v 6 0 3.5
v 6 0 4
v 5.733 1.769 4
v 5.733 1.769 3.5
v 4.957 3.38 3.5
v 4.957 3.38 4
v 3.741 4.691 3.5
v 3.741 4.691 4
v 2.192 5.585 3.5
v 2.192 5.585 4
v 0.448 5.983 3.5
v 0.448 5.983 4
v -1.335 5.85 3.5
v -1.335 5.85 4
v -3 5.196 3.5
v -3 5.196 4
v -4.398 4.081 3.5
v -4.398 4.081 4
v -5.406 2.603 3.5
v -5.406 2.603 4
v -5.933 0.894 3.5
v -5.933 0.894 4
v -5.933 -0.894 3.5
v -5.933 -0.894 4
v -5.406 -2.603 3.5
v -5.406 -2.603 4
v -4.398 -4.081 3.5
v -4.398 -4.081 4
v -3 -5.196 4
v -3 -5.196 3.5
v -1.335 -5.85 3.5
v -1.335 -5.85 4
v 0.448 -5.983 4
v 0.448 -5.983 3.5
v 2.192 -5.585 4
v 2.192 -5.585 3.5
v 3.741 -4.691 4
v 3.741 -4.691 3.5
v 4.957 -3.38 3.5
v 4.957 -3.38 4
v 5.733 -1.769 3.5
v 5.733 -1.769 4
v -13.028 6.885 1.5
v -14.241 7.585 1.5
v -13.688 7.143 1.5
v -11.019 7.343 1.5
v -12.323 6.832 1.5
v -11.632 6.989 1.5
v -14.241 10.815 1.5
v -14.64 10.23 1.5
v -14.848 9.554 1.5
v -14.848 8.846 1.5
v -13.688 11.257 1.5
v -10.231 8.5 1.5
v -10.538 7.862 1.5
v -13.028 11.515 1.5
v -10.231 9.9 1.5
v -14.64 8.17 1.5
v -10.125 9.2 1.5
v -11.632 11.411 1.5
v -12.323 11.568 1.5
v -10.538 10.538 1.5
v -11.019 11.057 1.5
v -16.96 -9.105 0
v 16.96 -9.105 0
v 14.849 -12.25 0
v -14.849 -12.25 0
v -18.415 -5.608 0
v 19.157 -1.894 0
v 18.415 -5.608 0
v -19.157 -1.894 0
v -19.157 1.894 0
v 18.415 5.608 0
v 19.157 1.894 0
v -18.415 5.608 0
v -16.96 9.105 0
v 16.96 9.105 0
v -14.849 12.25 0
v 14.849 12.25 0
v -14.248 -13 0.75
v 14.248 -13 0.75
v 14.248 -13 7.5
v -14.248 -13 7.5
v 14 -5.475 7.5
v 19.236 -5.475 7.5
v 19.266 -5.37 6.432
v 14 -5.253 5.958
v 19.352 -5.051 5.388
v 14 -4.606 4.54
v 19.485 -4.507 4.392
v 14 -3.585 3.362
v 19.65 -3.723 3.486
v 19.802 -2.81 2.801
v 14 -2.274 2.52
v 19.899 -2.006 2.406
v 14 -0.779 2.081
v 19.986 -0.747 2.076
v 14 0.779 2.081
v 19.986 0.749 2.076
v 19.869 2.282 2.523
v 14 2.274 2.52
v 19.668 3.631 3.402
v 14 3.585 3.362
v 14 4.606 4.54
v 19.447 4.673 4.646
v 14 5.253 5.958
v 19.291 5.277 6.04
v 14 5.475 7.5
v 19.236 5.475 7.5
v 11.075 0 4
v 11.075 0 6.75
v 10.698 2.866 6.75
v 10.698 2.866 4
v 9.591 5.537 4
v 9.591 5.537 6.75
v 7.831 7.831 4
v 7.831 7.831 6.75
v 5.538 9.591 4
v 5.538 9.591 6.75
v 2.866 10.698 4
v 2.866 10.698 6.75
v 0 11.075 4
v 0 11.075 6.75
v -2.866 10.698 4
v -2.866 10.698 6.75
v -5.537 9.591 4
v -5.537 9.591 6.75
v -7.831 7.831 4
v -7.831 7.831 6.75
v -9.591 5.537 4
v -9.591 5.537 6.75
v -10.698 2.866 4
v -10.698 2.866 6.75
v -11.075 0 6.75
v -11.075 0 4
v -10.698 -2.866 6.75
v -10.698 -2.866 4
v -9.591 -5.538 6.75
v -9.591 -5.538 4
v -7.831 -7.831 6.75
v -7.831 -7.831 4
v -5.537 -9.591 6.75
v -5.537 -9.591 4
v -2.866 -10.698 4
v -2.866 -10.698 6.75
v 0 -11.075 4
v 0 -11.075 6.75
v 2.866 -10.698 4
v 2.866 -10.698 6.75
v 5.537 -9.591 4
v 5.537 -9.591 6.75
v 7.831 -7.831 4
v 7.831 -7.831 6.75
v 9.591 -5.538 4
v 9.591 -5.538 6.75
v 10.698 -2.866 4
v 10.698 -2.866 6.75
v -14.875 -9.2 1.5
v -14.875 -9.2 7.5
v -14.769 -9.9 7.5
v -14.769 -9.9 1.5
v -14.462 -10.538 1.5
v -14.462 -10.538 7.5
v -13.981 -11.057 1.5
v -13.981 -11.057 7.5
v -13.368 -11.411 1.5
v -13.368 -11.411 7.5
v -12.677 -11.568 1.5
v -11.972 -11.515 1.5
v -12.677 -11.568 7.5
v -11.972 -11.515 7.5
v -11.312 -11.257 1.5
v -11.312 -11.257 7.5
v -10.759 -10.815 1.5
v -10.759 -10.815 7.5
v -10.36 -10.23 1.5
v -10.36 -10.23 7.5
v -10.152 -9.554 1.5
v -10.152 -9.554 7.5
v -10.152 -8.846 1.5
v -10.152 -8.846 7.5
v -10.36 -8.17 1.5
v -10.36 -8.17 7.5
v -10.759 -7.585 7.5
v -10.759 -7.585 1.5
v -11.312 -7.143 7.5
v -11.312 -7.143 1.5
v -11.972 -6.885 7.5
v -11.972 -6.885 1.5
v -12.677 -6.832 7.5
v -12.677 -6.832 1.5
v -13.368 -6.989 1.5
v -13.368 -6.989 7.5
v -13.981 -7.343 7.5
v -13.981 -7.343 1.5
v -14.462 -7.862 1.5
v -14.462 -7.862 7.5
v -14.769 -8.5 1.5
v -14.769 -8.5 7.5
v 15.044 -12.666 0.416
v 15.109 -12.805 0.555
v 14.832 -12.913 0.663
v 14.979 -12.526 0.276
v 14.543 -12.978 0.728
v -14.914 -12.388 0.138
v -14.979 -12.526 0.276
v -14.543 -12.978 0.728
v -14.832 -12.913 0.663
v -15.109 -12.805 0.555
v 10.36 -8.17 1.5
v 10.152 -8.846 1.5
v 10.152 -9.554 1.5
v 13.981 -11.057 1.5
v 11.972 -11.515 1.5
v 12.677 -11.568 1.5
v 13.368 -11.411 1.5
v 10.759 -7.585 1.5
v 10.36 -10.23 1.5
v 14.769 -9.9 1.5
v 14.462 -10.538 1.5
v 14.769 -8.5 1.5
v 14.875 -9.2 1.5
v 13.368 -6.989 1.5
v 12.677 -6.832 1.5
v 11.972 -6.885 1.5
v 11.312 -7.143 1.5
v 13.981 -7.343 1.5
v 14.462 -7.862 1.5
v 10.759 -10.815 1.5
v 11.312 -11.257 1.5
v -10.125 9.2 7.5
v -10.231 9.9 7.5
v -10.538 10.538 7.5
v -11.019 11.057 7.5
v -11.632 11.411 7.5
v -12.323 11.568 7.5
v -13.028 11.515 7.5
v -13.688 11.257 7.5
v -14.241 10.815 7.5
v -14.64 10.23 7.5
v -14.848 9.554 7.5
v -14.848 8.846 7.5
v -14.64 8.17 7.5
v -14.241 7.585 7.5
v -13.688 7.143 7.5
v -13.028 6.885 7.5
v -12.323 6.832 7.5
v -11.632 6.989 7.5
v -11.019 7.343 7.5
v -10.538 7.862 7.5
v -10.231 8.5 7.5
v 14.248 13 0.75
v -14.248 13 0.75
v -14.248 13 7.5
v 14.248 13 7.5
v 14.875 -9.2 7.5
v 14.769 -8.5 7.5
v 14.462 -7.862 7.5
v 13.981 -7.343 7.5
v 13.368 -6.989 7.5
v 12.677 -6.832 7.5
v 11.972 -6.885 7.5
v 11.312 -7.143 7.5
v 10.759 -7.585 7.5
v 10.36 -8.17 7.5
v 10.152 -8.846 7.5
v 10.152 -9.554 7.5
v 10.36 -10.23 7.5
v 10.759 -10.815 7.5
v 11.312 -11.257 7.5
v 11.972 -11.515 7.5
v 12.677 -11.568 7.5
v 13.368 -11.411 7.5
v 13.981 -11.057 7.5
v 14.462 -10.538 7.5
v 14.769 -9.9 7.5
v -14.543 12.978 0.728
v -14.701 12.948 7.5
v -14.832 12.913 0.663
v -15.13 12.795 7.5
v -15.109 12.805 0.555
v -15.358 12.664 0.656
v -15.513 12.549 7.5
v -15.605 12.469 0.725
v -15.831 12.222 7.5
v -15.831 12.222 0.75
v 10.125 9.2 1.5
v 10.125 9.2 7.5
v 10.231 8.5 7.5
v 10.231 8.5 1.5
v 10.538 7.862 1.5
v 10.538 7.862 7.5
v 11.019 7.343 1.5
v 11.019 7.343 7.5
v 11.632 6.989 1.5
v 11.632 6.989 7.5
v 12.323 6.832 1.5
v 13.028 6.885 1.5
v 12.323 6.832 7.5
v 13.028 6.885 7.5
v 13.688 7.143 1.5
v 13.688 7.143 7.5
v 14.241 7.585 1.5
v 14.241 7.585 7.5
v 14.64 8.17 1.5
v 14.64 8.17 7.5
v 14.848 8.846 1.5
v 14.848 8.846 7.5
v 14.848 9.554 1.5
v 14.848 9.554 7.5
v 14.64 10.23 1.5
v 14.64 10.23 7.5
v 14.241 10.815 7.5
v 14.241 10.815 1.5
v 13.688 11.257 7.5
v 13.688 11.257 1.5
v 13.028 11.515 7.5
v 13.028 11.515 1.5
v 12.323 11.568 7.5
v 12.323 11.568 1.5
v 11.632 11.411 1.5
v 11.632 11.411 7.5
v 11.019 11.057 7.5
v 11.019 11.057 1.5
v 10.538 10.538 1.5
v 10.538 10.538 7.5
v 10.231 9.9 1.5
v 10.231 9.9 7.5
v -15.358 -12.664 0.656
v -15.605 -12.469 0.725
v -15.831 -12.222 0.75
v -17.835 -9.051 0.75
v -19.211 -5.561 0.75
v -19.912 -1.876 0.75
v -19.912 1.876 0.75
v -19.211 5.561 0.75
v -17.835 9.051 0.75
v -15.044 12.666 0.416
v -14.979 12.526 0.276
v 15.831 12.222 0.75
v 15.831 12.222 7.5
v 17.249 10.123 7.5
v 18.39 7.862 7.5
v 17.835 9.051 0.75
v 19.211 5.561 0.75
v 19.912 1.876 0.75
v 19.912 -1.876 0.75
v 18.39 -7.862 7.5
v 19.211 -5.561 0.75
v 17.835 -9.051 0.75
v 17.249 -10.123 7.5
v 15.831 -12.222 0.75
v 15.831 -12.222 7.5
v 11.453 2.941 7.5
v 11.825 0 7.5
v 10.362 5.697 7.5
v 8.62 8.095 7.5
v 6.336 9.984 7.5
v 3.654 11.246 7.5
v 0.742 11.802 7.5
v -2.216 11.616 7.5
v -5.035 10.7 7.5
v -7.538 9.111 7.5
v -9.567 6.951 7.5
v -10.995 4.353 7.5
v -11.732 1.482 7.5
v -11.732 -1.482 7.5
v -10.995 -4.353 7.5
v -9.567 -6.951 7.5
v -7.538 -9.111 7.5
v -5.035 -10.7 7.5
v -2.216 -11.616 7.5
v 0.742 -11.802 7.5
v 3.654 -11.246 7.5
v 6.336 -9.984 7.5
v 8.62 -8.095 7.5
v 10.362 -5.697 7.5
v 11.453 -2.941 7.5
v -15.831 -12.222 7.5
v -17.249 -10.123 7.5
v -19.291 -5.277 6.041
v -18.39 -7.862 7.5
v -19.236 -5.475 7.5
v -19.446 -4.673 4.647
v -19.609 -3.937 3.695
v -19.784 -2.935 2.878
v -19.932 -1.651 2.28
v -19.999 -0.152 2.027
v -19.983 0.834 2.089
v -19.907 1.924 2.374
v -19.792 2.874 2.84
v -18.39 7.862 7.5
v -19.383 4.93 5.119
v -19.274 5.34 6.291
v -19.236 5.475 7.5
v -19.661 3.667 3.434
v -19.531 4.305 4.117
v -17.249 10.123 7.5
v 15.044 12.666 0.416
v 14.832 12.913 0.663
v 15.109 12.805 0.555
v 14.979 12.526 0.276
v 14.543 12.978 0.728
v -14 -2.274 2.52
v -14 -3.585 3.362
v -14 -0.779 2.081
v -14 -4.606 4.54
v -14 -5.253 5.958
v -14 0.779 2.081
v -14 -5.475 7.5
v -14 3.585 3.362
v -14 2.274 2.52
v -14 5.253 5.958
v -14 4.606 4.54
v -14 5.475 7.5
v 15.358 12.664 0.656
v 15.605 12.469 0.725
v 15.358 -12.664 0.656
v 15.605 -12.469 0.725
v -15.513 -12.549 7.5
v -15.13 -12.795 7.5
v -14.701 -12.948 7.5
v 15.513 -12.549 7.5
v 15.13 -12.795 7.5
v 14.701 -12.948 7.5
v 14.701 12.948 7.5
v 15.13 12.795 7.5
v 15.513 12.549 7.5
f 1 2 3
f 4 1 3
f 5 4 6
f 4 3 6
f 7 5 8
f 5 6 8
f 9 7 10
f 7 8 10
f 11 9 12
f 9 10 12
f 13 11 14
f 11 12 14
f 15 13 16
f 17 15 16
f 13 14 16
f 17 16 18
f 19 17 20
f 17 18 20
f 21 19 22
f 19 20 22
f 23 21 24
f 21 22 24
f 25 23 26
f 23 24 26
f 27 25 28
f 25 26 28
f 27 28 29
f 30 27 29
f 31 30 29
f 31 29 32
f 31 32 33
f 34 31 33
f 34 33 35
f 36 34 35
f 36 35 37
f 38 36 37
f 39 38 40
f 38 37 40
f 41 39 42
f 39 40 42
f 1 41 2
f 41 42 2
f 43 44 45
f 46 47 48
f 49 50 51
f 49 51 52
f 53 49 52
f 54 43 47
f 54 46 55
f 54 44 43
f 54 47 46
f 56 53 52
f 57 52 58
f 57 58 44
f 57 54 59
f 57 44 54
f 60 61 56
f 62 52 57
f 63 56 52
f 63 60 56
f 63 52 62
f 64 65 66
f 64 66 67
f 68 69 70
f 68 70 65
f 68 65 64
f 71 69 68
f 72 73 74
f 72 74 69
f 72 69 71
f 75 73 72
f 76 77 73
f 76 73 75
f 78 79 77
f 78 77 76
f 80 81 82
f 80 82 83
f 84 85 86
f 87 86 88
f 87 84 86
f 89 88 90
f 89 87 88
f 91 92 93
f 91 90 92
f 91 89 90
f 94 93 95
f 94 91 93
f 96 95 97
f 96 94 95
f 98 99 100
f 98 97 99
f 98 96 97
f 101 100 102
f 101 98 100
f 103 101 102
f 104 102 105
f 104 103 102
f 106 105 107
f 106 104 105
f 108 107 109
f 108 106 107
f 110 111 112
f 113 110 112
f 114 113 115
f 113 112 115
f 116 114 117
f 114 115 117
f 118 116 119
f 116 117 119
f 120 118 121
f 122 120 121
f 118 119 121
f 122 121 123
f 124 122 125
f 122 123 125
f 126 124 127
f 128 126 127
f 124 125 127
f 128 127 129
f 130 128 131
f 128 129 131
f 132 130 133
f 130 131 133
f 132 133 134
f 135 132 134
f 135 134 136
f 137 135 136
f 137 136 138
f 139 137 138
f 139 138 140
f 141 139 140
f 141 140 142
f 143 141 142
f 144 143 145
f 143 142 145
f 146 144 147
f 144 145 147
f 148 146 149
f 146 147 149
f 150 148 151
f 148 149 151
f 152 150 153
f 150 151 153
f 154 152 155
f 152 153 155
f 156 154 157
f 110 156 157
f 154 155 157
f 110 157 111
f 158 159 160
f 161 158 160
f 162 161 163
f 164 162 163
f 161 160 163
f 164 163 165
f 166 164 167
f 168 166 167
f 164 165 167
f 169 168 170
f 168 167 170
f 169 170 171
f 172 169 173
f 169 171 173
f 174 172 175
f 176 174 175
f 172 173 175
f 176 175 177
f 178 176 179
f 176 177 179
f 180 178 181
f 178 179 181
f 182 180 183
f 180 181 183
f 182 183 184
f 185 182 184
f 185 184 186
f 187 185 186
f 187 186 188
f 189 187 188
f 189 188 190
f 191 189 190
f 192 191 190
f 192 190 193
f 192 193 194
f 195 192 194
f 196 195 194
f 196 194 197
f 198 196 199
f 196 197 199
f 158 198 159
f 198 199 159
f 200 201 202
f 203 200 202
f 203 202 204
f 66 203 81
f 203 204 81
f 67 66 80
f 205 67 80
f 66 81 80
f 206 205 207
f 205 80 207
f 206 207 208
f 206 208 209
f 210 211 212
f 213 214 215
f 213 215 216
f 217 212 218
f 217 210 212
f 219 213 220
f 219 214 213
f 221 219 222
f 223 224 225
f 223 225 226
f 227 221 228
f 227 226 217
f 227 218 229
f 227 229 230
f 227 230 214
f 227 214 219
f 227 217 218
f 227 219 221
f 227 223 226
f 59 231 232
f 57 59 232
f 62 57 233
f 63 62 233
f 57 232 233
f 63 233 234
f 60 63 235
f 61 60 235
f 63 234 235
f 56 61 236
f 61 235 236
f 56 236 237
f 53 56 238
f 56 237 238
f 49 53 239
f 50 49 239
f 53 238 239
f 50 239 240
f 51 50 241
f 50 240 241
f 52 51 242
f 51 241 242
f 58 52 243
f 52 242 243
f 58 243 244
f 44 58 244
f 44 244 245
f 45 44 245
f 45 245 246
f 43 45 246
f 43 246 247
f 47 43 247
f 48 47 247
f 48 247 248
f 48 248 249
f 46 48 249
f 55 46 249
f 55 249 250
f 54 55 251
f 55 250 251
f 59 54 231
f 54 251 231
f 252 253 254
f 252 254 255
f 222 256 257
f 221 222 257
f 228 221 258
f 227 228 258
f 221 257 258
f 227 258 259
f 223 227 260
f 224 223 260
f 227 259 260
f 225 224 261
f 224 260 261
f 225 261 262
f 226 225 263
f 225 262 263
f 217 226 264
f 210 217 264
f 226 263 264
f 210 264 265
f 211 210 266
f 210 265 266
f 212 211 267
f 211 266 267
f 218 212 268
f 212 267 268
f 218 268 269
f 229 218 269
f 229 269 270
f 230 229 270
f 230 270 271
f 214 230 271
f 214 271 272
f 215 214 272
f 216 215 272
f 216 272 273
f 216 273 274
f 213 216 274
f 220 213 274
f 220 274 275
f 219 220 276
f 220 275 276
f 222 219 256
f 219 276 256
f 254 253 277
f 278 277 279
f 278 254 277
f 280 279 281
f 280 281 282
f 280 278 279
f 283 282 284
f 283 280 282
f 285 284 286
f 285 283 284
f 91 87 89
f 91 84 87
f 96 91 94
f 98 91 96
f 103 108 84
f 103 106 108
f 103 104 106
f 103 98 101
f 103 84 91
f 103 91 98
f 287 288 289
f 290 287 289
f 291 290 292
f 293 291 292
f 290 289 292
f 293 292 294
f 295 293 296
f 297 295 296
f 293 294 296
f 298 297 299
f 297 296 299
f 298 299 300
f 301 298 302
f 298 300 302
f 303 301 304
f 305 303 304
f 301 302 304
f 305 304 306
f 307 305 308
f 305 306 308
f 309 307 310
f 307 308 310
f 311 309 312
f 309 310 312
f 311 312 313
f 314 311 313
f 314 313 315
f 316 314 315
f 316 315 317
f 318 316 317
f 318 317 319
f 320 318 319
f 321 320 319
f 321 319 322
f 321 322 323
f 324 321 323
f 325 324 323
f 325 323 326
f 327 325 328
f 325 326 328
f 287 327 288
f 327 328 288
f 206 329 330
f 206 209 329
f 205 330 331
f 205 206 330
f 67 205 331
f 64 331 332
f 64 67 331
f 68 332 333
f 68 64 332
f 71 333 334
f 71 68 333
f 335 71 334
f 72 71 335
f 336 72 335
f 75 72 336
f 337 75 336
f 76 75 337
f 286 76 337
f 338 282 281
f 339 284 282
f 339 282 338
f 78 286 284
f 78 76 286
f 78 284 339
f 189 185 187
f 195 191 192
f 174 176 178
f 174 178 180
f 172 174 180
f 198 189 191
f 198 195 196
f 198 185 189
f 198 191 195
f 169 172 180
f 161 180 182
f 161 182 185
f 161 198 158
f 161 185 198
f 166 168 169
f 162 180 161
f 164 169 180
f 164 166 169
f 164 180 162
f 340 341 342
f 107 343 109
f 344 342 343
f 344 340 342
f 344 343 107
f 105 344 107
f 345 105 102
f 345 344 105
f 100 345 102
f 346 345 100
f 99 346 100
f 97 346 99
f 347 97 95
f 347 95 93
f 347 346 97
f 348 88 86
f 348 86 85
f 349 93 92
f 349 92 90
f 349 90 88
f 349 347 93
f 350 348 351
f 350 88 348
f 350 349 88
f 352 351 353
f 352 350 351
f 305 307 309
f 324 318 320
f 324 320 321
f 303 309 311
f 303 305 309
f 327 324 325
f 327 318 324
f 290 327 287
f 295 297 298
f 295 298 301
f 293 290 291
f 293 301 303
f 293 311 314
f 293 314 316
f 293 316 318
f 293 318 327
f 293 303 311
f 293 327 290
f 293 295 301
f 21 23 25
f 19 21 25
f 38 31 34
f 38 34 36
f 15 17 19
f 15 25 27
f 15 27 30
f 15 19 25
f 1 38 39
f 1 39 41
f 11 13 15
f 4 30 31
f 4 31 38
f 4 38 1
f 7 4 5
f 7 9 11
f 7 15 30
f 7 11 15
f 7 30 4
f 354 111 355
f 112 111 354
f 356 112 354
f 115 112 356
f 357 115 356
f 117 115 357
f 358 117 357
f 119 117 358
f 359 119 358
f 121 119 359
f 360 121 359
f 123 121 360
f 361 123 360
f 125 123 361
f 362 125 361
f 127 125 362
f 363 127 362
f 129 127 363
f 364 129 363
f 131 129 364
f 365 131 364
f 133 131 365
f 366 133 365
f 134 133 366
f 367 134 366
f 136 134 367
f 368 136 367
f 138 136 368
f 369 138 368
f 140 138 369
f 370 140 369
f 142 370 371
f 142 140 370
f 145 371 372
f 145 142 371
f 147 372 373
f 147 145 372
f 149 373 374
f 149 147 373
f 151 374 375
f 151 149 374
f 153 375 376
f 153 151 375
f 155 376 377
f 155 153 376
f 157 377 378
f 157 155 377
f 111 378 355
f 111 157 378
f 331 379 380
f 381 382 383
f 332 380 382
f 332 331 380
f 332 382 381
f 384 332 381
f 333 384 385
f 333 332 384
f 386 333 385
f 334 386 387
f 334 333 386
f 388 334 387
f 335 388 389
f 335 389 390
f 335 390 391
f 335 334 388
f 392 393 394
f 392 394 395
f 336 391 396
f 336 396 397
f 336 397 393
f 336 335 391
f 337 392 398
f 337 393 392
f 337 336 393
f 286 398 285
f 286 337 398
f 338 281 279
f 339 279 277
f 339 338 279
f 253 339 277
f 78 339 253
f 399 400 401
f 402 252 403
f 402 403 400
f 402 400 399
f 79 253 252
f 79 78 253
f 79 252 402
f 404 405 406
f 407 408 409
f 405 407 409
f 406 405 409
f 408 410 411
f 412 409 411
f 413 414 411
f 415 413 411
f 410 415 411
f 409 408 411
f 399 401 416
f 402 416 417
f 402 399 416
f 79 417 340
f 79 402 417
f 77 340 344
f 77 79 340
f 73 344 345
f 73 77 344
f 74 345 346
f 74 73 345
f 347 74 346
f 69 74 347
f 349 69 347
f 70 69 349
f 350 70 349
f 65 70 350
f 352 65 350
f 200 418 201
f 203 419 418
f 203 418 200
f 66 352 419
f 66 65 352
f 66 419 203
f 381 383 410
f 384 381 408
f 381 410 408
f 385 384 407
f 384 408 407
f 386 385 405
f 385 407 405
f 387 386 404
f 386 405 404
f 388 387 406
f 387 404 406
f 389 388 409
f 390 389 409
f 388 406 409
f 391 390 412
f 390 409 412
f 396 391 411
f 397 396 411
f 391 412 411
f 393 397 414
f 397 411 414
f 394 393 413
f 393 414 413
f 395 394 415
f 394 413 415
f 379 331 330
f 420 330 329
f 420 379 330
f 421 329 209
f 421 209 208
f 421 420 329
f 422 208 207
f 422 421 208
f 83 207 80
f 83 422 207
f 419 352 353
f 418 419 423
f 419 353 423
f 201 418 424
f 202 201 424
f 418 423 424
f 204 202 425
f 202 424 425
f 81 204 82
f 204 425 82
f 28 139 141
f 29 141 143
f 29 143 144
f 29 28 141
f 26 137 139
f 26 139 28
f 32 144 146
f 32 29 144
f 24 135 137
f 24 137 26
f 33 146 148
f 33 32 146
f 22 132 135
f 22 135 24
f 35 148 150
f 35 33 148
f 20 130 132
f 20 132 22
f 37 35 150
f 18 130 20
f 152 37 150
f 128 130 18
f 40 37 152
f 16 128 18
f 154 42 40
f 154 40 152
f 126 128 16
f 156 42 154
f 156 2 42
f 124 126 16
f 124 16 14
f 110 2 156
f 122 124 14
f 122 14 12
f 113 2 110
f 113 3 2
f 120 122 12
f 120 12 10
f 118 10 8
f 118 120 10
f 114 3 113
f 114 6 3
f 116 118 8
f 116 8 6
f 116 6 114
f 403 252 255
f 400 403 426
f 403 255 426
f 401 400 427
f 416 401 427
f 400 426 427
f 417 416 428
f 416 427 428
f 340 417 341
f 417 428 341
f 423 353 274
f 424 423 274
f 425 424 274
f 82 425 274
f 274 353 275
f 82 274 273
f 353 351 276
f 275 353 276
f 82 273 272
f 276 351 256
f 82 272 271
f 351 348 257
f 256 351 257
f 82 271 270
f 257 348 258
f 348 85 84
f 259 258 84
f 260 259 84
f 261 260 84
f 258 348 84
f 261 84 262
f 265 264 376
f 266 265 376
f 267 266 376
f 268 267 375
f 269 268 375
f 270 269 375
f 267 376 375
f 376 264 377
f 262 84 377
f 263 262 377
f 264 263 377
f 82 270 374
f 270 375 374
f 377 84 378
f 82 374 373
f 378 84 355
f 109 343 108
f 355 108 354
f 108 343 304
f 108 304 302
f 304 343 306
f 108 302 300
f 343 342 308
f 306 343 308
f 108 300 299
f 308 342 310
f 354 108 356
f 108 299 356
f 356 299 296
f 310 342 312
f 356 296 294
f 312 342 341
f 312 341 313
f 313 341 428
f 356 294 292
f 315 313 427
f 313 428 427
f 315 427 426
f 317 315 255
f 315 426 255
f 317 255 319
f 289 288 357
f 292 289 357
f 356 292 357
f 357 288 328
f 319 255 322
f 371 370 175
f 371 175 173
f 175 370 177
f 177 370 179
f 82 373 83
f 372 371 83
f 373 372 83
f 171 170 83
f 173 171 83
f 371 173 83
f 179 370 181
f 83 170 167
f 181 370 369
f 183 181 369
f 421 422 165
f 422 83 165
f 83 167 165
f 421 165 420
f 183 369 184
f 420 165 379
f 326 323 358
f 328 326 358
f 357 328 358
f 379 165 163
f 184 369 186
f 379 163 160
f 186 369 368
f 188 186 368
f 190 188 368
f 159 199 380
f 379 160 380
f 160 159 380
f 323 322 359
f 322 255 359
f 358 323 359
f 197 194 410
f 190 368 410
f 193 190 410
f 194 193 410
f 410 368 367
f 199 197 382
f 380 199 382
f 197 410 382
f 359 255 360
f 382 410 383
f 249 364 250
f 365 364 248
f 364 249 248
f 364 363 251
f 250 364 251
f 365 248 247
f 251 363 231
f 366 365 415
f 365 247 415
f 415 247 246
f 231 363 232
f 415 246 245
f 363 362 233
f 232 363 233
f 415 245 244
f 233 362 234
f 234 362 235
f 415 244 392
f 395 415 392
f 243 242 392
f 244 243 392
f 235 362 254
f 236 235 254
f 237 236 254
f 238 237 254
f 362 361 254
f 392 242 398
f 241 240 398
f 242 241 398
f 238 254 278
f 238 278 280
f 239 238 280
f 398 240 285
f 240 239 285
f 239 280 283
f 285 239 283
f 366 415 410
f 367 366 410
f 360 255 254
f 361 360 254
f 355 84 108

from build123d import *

# Parameters (mm, degrees)
AUFSATZ_LINEAR_AUSTRAGEN1_DEPTH = 7.5
SKIZZE2_R                       = 11.075
SCHNITT_LINEAR_AUSTRAGEN1_DEPTH = 3.5
SKIZZE3_R                       = 5.475
SCHNITT_LINEAR_AUSTRAGEN2_DEPTH = 38.165171868
SKIZZE4_R                       = 2.375
SCHNITT_LINEAR_AUSTRAGEN3_DEPTH = 6
FASE1_SIZE                      = 0.75
VERRUNDUNG1_R                   = 2
SKIZZE5_R                       = 6
SCHNITT_LINEAR_AUSTRAGEN4_DEPTH = 0.5


with BuildPart() as part:
    # Skizze1 → Aufsatz-Linear austragen1 (new body)
    with BuildSketch(Plane.XY):
        with BuildLine():
            Line((-15.198684154, 13), (15.198684154, 13))
            ThreePointArc((15.198684154, 13), (20, 0), (15.198684154, -13))
            Line((15.198684154, -13), (-15.198684154, -13))
            ThreePointArc((-15.198684154, -13), (-20, 0), (-15.198684154, 13))
        make_face()
    extrude(amount=AUFSATZ_LINEAR_AUSTRAGEN1_DEPTH)

    # Skizze2 → Schnitt-Linear austragen1 (cut)
    with BuildSketch(Plane.XY.offset(7.5)):
        Circle(SKIZZE2_R)
    extrude(amount=-SCHNITT_LINEAR_AUSTRAGEN1_DEPTH, mode=Mode.SUBTRACT)

    # Skizze3 → Schnitt-Linear austragen2 (cut, through all)
    with BuildSketch(Plane(origin=(14, 0, 0), x_dir=(0, 0, -1), z_dir=(1, 0, 0))):
        with Locations((-7.5, 0)):
            Circle(SKIZZE3_R)
    schnitt_linear_austragen2 = extrude(amount=SCHNITT_LINEAR_AUSTRAGEN2_DEPTH, mode=Mode.SUBTRACT)

    # Spiegeln1: Schnitt-Linear austragen2 across plane
    add(schnitt_linear_austragen2.mirror(Plane(origin=(0, 0, 0), x_dir=(0, 0, 1), z_dir=(1, 0, 0))), mode=Mode.SUBTRACT)

    # Skizze4 → Schnitt-Linear austragen3 (cut)
    with BuildSketch(Plane.XY.offset(7.5)):
        with Locations((-12.5, 9.2)):
            Circle(SKIZZE4_R)
        with Locations(Location((12.5, 9.2, 0), (0, 0, 180))):
            Circle(SKIZZE4_R)
        with Locations((12.5, -9.2)):
            Circle(SKIZZE4_R)
        with Locations(Location((-12.5, -9.2, 0), (0, 0, 180))):
            Circle(SKIZZE4_R)
    extrude(amount=-SCHNITT_LINEAR_AUSTRAGEN3_DEPTH, mode=Mode.SUBTRACT)

    # Fase1
    fase1_edges = [part.edges().sort_by_distance(p)[0] for p in [
        (-11.075, 0, 7.5),
        (0, 13, 0),
        (20, 0, 0),
        (0, -13, 0),
        (-20, 0, 0),
    ]]
    chamfer(fase1_edges, length=FASE1_SIZE)

    # Verrundung1
    verrundung1_edges = [part.edges().sort_by_distance(p)[0] for p in [
        (-15.198684154, -13, 4.125),
        (15.198684154, -13, 4.125),
        (15.198684154, 13, 4.125),
        (-15.198684154, 13, 4.125),
    ]]
    fillet(verrundung1_edges, radius=VERRUNDUNG1_R)

    # Skizze5 → Schnitt-Linear austragen4 (cut)
    with BuildSketch(Plane.XY.offset(4)):
        Circle(SKIZZE5_R)
    extrude(amount=-SCHNITT_LINEAR_AUSTRAGEN4_DEPTH, mode=Mode.SUBTRACT)


solid = part.part
